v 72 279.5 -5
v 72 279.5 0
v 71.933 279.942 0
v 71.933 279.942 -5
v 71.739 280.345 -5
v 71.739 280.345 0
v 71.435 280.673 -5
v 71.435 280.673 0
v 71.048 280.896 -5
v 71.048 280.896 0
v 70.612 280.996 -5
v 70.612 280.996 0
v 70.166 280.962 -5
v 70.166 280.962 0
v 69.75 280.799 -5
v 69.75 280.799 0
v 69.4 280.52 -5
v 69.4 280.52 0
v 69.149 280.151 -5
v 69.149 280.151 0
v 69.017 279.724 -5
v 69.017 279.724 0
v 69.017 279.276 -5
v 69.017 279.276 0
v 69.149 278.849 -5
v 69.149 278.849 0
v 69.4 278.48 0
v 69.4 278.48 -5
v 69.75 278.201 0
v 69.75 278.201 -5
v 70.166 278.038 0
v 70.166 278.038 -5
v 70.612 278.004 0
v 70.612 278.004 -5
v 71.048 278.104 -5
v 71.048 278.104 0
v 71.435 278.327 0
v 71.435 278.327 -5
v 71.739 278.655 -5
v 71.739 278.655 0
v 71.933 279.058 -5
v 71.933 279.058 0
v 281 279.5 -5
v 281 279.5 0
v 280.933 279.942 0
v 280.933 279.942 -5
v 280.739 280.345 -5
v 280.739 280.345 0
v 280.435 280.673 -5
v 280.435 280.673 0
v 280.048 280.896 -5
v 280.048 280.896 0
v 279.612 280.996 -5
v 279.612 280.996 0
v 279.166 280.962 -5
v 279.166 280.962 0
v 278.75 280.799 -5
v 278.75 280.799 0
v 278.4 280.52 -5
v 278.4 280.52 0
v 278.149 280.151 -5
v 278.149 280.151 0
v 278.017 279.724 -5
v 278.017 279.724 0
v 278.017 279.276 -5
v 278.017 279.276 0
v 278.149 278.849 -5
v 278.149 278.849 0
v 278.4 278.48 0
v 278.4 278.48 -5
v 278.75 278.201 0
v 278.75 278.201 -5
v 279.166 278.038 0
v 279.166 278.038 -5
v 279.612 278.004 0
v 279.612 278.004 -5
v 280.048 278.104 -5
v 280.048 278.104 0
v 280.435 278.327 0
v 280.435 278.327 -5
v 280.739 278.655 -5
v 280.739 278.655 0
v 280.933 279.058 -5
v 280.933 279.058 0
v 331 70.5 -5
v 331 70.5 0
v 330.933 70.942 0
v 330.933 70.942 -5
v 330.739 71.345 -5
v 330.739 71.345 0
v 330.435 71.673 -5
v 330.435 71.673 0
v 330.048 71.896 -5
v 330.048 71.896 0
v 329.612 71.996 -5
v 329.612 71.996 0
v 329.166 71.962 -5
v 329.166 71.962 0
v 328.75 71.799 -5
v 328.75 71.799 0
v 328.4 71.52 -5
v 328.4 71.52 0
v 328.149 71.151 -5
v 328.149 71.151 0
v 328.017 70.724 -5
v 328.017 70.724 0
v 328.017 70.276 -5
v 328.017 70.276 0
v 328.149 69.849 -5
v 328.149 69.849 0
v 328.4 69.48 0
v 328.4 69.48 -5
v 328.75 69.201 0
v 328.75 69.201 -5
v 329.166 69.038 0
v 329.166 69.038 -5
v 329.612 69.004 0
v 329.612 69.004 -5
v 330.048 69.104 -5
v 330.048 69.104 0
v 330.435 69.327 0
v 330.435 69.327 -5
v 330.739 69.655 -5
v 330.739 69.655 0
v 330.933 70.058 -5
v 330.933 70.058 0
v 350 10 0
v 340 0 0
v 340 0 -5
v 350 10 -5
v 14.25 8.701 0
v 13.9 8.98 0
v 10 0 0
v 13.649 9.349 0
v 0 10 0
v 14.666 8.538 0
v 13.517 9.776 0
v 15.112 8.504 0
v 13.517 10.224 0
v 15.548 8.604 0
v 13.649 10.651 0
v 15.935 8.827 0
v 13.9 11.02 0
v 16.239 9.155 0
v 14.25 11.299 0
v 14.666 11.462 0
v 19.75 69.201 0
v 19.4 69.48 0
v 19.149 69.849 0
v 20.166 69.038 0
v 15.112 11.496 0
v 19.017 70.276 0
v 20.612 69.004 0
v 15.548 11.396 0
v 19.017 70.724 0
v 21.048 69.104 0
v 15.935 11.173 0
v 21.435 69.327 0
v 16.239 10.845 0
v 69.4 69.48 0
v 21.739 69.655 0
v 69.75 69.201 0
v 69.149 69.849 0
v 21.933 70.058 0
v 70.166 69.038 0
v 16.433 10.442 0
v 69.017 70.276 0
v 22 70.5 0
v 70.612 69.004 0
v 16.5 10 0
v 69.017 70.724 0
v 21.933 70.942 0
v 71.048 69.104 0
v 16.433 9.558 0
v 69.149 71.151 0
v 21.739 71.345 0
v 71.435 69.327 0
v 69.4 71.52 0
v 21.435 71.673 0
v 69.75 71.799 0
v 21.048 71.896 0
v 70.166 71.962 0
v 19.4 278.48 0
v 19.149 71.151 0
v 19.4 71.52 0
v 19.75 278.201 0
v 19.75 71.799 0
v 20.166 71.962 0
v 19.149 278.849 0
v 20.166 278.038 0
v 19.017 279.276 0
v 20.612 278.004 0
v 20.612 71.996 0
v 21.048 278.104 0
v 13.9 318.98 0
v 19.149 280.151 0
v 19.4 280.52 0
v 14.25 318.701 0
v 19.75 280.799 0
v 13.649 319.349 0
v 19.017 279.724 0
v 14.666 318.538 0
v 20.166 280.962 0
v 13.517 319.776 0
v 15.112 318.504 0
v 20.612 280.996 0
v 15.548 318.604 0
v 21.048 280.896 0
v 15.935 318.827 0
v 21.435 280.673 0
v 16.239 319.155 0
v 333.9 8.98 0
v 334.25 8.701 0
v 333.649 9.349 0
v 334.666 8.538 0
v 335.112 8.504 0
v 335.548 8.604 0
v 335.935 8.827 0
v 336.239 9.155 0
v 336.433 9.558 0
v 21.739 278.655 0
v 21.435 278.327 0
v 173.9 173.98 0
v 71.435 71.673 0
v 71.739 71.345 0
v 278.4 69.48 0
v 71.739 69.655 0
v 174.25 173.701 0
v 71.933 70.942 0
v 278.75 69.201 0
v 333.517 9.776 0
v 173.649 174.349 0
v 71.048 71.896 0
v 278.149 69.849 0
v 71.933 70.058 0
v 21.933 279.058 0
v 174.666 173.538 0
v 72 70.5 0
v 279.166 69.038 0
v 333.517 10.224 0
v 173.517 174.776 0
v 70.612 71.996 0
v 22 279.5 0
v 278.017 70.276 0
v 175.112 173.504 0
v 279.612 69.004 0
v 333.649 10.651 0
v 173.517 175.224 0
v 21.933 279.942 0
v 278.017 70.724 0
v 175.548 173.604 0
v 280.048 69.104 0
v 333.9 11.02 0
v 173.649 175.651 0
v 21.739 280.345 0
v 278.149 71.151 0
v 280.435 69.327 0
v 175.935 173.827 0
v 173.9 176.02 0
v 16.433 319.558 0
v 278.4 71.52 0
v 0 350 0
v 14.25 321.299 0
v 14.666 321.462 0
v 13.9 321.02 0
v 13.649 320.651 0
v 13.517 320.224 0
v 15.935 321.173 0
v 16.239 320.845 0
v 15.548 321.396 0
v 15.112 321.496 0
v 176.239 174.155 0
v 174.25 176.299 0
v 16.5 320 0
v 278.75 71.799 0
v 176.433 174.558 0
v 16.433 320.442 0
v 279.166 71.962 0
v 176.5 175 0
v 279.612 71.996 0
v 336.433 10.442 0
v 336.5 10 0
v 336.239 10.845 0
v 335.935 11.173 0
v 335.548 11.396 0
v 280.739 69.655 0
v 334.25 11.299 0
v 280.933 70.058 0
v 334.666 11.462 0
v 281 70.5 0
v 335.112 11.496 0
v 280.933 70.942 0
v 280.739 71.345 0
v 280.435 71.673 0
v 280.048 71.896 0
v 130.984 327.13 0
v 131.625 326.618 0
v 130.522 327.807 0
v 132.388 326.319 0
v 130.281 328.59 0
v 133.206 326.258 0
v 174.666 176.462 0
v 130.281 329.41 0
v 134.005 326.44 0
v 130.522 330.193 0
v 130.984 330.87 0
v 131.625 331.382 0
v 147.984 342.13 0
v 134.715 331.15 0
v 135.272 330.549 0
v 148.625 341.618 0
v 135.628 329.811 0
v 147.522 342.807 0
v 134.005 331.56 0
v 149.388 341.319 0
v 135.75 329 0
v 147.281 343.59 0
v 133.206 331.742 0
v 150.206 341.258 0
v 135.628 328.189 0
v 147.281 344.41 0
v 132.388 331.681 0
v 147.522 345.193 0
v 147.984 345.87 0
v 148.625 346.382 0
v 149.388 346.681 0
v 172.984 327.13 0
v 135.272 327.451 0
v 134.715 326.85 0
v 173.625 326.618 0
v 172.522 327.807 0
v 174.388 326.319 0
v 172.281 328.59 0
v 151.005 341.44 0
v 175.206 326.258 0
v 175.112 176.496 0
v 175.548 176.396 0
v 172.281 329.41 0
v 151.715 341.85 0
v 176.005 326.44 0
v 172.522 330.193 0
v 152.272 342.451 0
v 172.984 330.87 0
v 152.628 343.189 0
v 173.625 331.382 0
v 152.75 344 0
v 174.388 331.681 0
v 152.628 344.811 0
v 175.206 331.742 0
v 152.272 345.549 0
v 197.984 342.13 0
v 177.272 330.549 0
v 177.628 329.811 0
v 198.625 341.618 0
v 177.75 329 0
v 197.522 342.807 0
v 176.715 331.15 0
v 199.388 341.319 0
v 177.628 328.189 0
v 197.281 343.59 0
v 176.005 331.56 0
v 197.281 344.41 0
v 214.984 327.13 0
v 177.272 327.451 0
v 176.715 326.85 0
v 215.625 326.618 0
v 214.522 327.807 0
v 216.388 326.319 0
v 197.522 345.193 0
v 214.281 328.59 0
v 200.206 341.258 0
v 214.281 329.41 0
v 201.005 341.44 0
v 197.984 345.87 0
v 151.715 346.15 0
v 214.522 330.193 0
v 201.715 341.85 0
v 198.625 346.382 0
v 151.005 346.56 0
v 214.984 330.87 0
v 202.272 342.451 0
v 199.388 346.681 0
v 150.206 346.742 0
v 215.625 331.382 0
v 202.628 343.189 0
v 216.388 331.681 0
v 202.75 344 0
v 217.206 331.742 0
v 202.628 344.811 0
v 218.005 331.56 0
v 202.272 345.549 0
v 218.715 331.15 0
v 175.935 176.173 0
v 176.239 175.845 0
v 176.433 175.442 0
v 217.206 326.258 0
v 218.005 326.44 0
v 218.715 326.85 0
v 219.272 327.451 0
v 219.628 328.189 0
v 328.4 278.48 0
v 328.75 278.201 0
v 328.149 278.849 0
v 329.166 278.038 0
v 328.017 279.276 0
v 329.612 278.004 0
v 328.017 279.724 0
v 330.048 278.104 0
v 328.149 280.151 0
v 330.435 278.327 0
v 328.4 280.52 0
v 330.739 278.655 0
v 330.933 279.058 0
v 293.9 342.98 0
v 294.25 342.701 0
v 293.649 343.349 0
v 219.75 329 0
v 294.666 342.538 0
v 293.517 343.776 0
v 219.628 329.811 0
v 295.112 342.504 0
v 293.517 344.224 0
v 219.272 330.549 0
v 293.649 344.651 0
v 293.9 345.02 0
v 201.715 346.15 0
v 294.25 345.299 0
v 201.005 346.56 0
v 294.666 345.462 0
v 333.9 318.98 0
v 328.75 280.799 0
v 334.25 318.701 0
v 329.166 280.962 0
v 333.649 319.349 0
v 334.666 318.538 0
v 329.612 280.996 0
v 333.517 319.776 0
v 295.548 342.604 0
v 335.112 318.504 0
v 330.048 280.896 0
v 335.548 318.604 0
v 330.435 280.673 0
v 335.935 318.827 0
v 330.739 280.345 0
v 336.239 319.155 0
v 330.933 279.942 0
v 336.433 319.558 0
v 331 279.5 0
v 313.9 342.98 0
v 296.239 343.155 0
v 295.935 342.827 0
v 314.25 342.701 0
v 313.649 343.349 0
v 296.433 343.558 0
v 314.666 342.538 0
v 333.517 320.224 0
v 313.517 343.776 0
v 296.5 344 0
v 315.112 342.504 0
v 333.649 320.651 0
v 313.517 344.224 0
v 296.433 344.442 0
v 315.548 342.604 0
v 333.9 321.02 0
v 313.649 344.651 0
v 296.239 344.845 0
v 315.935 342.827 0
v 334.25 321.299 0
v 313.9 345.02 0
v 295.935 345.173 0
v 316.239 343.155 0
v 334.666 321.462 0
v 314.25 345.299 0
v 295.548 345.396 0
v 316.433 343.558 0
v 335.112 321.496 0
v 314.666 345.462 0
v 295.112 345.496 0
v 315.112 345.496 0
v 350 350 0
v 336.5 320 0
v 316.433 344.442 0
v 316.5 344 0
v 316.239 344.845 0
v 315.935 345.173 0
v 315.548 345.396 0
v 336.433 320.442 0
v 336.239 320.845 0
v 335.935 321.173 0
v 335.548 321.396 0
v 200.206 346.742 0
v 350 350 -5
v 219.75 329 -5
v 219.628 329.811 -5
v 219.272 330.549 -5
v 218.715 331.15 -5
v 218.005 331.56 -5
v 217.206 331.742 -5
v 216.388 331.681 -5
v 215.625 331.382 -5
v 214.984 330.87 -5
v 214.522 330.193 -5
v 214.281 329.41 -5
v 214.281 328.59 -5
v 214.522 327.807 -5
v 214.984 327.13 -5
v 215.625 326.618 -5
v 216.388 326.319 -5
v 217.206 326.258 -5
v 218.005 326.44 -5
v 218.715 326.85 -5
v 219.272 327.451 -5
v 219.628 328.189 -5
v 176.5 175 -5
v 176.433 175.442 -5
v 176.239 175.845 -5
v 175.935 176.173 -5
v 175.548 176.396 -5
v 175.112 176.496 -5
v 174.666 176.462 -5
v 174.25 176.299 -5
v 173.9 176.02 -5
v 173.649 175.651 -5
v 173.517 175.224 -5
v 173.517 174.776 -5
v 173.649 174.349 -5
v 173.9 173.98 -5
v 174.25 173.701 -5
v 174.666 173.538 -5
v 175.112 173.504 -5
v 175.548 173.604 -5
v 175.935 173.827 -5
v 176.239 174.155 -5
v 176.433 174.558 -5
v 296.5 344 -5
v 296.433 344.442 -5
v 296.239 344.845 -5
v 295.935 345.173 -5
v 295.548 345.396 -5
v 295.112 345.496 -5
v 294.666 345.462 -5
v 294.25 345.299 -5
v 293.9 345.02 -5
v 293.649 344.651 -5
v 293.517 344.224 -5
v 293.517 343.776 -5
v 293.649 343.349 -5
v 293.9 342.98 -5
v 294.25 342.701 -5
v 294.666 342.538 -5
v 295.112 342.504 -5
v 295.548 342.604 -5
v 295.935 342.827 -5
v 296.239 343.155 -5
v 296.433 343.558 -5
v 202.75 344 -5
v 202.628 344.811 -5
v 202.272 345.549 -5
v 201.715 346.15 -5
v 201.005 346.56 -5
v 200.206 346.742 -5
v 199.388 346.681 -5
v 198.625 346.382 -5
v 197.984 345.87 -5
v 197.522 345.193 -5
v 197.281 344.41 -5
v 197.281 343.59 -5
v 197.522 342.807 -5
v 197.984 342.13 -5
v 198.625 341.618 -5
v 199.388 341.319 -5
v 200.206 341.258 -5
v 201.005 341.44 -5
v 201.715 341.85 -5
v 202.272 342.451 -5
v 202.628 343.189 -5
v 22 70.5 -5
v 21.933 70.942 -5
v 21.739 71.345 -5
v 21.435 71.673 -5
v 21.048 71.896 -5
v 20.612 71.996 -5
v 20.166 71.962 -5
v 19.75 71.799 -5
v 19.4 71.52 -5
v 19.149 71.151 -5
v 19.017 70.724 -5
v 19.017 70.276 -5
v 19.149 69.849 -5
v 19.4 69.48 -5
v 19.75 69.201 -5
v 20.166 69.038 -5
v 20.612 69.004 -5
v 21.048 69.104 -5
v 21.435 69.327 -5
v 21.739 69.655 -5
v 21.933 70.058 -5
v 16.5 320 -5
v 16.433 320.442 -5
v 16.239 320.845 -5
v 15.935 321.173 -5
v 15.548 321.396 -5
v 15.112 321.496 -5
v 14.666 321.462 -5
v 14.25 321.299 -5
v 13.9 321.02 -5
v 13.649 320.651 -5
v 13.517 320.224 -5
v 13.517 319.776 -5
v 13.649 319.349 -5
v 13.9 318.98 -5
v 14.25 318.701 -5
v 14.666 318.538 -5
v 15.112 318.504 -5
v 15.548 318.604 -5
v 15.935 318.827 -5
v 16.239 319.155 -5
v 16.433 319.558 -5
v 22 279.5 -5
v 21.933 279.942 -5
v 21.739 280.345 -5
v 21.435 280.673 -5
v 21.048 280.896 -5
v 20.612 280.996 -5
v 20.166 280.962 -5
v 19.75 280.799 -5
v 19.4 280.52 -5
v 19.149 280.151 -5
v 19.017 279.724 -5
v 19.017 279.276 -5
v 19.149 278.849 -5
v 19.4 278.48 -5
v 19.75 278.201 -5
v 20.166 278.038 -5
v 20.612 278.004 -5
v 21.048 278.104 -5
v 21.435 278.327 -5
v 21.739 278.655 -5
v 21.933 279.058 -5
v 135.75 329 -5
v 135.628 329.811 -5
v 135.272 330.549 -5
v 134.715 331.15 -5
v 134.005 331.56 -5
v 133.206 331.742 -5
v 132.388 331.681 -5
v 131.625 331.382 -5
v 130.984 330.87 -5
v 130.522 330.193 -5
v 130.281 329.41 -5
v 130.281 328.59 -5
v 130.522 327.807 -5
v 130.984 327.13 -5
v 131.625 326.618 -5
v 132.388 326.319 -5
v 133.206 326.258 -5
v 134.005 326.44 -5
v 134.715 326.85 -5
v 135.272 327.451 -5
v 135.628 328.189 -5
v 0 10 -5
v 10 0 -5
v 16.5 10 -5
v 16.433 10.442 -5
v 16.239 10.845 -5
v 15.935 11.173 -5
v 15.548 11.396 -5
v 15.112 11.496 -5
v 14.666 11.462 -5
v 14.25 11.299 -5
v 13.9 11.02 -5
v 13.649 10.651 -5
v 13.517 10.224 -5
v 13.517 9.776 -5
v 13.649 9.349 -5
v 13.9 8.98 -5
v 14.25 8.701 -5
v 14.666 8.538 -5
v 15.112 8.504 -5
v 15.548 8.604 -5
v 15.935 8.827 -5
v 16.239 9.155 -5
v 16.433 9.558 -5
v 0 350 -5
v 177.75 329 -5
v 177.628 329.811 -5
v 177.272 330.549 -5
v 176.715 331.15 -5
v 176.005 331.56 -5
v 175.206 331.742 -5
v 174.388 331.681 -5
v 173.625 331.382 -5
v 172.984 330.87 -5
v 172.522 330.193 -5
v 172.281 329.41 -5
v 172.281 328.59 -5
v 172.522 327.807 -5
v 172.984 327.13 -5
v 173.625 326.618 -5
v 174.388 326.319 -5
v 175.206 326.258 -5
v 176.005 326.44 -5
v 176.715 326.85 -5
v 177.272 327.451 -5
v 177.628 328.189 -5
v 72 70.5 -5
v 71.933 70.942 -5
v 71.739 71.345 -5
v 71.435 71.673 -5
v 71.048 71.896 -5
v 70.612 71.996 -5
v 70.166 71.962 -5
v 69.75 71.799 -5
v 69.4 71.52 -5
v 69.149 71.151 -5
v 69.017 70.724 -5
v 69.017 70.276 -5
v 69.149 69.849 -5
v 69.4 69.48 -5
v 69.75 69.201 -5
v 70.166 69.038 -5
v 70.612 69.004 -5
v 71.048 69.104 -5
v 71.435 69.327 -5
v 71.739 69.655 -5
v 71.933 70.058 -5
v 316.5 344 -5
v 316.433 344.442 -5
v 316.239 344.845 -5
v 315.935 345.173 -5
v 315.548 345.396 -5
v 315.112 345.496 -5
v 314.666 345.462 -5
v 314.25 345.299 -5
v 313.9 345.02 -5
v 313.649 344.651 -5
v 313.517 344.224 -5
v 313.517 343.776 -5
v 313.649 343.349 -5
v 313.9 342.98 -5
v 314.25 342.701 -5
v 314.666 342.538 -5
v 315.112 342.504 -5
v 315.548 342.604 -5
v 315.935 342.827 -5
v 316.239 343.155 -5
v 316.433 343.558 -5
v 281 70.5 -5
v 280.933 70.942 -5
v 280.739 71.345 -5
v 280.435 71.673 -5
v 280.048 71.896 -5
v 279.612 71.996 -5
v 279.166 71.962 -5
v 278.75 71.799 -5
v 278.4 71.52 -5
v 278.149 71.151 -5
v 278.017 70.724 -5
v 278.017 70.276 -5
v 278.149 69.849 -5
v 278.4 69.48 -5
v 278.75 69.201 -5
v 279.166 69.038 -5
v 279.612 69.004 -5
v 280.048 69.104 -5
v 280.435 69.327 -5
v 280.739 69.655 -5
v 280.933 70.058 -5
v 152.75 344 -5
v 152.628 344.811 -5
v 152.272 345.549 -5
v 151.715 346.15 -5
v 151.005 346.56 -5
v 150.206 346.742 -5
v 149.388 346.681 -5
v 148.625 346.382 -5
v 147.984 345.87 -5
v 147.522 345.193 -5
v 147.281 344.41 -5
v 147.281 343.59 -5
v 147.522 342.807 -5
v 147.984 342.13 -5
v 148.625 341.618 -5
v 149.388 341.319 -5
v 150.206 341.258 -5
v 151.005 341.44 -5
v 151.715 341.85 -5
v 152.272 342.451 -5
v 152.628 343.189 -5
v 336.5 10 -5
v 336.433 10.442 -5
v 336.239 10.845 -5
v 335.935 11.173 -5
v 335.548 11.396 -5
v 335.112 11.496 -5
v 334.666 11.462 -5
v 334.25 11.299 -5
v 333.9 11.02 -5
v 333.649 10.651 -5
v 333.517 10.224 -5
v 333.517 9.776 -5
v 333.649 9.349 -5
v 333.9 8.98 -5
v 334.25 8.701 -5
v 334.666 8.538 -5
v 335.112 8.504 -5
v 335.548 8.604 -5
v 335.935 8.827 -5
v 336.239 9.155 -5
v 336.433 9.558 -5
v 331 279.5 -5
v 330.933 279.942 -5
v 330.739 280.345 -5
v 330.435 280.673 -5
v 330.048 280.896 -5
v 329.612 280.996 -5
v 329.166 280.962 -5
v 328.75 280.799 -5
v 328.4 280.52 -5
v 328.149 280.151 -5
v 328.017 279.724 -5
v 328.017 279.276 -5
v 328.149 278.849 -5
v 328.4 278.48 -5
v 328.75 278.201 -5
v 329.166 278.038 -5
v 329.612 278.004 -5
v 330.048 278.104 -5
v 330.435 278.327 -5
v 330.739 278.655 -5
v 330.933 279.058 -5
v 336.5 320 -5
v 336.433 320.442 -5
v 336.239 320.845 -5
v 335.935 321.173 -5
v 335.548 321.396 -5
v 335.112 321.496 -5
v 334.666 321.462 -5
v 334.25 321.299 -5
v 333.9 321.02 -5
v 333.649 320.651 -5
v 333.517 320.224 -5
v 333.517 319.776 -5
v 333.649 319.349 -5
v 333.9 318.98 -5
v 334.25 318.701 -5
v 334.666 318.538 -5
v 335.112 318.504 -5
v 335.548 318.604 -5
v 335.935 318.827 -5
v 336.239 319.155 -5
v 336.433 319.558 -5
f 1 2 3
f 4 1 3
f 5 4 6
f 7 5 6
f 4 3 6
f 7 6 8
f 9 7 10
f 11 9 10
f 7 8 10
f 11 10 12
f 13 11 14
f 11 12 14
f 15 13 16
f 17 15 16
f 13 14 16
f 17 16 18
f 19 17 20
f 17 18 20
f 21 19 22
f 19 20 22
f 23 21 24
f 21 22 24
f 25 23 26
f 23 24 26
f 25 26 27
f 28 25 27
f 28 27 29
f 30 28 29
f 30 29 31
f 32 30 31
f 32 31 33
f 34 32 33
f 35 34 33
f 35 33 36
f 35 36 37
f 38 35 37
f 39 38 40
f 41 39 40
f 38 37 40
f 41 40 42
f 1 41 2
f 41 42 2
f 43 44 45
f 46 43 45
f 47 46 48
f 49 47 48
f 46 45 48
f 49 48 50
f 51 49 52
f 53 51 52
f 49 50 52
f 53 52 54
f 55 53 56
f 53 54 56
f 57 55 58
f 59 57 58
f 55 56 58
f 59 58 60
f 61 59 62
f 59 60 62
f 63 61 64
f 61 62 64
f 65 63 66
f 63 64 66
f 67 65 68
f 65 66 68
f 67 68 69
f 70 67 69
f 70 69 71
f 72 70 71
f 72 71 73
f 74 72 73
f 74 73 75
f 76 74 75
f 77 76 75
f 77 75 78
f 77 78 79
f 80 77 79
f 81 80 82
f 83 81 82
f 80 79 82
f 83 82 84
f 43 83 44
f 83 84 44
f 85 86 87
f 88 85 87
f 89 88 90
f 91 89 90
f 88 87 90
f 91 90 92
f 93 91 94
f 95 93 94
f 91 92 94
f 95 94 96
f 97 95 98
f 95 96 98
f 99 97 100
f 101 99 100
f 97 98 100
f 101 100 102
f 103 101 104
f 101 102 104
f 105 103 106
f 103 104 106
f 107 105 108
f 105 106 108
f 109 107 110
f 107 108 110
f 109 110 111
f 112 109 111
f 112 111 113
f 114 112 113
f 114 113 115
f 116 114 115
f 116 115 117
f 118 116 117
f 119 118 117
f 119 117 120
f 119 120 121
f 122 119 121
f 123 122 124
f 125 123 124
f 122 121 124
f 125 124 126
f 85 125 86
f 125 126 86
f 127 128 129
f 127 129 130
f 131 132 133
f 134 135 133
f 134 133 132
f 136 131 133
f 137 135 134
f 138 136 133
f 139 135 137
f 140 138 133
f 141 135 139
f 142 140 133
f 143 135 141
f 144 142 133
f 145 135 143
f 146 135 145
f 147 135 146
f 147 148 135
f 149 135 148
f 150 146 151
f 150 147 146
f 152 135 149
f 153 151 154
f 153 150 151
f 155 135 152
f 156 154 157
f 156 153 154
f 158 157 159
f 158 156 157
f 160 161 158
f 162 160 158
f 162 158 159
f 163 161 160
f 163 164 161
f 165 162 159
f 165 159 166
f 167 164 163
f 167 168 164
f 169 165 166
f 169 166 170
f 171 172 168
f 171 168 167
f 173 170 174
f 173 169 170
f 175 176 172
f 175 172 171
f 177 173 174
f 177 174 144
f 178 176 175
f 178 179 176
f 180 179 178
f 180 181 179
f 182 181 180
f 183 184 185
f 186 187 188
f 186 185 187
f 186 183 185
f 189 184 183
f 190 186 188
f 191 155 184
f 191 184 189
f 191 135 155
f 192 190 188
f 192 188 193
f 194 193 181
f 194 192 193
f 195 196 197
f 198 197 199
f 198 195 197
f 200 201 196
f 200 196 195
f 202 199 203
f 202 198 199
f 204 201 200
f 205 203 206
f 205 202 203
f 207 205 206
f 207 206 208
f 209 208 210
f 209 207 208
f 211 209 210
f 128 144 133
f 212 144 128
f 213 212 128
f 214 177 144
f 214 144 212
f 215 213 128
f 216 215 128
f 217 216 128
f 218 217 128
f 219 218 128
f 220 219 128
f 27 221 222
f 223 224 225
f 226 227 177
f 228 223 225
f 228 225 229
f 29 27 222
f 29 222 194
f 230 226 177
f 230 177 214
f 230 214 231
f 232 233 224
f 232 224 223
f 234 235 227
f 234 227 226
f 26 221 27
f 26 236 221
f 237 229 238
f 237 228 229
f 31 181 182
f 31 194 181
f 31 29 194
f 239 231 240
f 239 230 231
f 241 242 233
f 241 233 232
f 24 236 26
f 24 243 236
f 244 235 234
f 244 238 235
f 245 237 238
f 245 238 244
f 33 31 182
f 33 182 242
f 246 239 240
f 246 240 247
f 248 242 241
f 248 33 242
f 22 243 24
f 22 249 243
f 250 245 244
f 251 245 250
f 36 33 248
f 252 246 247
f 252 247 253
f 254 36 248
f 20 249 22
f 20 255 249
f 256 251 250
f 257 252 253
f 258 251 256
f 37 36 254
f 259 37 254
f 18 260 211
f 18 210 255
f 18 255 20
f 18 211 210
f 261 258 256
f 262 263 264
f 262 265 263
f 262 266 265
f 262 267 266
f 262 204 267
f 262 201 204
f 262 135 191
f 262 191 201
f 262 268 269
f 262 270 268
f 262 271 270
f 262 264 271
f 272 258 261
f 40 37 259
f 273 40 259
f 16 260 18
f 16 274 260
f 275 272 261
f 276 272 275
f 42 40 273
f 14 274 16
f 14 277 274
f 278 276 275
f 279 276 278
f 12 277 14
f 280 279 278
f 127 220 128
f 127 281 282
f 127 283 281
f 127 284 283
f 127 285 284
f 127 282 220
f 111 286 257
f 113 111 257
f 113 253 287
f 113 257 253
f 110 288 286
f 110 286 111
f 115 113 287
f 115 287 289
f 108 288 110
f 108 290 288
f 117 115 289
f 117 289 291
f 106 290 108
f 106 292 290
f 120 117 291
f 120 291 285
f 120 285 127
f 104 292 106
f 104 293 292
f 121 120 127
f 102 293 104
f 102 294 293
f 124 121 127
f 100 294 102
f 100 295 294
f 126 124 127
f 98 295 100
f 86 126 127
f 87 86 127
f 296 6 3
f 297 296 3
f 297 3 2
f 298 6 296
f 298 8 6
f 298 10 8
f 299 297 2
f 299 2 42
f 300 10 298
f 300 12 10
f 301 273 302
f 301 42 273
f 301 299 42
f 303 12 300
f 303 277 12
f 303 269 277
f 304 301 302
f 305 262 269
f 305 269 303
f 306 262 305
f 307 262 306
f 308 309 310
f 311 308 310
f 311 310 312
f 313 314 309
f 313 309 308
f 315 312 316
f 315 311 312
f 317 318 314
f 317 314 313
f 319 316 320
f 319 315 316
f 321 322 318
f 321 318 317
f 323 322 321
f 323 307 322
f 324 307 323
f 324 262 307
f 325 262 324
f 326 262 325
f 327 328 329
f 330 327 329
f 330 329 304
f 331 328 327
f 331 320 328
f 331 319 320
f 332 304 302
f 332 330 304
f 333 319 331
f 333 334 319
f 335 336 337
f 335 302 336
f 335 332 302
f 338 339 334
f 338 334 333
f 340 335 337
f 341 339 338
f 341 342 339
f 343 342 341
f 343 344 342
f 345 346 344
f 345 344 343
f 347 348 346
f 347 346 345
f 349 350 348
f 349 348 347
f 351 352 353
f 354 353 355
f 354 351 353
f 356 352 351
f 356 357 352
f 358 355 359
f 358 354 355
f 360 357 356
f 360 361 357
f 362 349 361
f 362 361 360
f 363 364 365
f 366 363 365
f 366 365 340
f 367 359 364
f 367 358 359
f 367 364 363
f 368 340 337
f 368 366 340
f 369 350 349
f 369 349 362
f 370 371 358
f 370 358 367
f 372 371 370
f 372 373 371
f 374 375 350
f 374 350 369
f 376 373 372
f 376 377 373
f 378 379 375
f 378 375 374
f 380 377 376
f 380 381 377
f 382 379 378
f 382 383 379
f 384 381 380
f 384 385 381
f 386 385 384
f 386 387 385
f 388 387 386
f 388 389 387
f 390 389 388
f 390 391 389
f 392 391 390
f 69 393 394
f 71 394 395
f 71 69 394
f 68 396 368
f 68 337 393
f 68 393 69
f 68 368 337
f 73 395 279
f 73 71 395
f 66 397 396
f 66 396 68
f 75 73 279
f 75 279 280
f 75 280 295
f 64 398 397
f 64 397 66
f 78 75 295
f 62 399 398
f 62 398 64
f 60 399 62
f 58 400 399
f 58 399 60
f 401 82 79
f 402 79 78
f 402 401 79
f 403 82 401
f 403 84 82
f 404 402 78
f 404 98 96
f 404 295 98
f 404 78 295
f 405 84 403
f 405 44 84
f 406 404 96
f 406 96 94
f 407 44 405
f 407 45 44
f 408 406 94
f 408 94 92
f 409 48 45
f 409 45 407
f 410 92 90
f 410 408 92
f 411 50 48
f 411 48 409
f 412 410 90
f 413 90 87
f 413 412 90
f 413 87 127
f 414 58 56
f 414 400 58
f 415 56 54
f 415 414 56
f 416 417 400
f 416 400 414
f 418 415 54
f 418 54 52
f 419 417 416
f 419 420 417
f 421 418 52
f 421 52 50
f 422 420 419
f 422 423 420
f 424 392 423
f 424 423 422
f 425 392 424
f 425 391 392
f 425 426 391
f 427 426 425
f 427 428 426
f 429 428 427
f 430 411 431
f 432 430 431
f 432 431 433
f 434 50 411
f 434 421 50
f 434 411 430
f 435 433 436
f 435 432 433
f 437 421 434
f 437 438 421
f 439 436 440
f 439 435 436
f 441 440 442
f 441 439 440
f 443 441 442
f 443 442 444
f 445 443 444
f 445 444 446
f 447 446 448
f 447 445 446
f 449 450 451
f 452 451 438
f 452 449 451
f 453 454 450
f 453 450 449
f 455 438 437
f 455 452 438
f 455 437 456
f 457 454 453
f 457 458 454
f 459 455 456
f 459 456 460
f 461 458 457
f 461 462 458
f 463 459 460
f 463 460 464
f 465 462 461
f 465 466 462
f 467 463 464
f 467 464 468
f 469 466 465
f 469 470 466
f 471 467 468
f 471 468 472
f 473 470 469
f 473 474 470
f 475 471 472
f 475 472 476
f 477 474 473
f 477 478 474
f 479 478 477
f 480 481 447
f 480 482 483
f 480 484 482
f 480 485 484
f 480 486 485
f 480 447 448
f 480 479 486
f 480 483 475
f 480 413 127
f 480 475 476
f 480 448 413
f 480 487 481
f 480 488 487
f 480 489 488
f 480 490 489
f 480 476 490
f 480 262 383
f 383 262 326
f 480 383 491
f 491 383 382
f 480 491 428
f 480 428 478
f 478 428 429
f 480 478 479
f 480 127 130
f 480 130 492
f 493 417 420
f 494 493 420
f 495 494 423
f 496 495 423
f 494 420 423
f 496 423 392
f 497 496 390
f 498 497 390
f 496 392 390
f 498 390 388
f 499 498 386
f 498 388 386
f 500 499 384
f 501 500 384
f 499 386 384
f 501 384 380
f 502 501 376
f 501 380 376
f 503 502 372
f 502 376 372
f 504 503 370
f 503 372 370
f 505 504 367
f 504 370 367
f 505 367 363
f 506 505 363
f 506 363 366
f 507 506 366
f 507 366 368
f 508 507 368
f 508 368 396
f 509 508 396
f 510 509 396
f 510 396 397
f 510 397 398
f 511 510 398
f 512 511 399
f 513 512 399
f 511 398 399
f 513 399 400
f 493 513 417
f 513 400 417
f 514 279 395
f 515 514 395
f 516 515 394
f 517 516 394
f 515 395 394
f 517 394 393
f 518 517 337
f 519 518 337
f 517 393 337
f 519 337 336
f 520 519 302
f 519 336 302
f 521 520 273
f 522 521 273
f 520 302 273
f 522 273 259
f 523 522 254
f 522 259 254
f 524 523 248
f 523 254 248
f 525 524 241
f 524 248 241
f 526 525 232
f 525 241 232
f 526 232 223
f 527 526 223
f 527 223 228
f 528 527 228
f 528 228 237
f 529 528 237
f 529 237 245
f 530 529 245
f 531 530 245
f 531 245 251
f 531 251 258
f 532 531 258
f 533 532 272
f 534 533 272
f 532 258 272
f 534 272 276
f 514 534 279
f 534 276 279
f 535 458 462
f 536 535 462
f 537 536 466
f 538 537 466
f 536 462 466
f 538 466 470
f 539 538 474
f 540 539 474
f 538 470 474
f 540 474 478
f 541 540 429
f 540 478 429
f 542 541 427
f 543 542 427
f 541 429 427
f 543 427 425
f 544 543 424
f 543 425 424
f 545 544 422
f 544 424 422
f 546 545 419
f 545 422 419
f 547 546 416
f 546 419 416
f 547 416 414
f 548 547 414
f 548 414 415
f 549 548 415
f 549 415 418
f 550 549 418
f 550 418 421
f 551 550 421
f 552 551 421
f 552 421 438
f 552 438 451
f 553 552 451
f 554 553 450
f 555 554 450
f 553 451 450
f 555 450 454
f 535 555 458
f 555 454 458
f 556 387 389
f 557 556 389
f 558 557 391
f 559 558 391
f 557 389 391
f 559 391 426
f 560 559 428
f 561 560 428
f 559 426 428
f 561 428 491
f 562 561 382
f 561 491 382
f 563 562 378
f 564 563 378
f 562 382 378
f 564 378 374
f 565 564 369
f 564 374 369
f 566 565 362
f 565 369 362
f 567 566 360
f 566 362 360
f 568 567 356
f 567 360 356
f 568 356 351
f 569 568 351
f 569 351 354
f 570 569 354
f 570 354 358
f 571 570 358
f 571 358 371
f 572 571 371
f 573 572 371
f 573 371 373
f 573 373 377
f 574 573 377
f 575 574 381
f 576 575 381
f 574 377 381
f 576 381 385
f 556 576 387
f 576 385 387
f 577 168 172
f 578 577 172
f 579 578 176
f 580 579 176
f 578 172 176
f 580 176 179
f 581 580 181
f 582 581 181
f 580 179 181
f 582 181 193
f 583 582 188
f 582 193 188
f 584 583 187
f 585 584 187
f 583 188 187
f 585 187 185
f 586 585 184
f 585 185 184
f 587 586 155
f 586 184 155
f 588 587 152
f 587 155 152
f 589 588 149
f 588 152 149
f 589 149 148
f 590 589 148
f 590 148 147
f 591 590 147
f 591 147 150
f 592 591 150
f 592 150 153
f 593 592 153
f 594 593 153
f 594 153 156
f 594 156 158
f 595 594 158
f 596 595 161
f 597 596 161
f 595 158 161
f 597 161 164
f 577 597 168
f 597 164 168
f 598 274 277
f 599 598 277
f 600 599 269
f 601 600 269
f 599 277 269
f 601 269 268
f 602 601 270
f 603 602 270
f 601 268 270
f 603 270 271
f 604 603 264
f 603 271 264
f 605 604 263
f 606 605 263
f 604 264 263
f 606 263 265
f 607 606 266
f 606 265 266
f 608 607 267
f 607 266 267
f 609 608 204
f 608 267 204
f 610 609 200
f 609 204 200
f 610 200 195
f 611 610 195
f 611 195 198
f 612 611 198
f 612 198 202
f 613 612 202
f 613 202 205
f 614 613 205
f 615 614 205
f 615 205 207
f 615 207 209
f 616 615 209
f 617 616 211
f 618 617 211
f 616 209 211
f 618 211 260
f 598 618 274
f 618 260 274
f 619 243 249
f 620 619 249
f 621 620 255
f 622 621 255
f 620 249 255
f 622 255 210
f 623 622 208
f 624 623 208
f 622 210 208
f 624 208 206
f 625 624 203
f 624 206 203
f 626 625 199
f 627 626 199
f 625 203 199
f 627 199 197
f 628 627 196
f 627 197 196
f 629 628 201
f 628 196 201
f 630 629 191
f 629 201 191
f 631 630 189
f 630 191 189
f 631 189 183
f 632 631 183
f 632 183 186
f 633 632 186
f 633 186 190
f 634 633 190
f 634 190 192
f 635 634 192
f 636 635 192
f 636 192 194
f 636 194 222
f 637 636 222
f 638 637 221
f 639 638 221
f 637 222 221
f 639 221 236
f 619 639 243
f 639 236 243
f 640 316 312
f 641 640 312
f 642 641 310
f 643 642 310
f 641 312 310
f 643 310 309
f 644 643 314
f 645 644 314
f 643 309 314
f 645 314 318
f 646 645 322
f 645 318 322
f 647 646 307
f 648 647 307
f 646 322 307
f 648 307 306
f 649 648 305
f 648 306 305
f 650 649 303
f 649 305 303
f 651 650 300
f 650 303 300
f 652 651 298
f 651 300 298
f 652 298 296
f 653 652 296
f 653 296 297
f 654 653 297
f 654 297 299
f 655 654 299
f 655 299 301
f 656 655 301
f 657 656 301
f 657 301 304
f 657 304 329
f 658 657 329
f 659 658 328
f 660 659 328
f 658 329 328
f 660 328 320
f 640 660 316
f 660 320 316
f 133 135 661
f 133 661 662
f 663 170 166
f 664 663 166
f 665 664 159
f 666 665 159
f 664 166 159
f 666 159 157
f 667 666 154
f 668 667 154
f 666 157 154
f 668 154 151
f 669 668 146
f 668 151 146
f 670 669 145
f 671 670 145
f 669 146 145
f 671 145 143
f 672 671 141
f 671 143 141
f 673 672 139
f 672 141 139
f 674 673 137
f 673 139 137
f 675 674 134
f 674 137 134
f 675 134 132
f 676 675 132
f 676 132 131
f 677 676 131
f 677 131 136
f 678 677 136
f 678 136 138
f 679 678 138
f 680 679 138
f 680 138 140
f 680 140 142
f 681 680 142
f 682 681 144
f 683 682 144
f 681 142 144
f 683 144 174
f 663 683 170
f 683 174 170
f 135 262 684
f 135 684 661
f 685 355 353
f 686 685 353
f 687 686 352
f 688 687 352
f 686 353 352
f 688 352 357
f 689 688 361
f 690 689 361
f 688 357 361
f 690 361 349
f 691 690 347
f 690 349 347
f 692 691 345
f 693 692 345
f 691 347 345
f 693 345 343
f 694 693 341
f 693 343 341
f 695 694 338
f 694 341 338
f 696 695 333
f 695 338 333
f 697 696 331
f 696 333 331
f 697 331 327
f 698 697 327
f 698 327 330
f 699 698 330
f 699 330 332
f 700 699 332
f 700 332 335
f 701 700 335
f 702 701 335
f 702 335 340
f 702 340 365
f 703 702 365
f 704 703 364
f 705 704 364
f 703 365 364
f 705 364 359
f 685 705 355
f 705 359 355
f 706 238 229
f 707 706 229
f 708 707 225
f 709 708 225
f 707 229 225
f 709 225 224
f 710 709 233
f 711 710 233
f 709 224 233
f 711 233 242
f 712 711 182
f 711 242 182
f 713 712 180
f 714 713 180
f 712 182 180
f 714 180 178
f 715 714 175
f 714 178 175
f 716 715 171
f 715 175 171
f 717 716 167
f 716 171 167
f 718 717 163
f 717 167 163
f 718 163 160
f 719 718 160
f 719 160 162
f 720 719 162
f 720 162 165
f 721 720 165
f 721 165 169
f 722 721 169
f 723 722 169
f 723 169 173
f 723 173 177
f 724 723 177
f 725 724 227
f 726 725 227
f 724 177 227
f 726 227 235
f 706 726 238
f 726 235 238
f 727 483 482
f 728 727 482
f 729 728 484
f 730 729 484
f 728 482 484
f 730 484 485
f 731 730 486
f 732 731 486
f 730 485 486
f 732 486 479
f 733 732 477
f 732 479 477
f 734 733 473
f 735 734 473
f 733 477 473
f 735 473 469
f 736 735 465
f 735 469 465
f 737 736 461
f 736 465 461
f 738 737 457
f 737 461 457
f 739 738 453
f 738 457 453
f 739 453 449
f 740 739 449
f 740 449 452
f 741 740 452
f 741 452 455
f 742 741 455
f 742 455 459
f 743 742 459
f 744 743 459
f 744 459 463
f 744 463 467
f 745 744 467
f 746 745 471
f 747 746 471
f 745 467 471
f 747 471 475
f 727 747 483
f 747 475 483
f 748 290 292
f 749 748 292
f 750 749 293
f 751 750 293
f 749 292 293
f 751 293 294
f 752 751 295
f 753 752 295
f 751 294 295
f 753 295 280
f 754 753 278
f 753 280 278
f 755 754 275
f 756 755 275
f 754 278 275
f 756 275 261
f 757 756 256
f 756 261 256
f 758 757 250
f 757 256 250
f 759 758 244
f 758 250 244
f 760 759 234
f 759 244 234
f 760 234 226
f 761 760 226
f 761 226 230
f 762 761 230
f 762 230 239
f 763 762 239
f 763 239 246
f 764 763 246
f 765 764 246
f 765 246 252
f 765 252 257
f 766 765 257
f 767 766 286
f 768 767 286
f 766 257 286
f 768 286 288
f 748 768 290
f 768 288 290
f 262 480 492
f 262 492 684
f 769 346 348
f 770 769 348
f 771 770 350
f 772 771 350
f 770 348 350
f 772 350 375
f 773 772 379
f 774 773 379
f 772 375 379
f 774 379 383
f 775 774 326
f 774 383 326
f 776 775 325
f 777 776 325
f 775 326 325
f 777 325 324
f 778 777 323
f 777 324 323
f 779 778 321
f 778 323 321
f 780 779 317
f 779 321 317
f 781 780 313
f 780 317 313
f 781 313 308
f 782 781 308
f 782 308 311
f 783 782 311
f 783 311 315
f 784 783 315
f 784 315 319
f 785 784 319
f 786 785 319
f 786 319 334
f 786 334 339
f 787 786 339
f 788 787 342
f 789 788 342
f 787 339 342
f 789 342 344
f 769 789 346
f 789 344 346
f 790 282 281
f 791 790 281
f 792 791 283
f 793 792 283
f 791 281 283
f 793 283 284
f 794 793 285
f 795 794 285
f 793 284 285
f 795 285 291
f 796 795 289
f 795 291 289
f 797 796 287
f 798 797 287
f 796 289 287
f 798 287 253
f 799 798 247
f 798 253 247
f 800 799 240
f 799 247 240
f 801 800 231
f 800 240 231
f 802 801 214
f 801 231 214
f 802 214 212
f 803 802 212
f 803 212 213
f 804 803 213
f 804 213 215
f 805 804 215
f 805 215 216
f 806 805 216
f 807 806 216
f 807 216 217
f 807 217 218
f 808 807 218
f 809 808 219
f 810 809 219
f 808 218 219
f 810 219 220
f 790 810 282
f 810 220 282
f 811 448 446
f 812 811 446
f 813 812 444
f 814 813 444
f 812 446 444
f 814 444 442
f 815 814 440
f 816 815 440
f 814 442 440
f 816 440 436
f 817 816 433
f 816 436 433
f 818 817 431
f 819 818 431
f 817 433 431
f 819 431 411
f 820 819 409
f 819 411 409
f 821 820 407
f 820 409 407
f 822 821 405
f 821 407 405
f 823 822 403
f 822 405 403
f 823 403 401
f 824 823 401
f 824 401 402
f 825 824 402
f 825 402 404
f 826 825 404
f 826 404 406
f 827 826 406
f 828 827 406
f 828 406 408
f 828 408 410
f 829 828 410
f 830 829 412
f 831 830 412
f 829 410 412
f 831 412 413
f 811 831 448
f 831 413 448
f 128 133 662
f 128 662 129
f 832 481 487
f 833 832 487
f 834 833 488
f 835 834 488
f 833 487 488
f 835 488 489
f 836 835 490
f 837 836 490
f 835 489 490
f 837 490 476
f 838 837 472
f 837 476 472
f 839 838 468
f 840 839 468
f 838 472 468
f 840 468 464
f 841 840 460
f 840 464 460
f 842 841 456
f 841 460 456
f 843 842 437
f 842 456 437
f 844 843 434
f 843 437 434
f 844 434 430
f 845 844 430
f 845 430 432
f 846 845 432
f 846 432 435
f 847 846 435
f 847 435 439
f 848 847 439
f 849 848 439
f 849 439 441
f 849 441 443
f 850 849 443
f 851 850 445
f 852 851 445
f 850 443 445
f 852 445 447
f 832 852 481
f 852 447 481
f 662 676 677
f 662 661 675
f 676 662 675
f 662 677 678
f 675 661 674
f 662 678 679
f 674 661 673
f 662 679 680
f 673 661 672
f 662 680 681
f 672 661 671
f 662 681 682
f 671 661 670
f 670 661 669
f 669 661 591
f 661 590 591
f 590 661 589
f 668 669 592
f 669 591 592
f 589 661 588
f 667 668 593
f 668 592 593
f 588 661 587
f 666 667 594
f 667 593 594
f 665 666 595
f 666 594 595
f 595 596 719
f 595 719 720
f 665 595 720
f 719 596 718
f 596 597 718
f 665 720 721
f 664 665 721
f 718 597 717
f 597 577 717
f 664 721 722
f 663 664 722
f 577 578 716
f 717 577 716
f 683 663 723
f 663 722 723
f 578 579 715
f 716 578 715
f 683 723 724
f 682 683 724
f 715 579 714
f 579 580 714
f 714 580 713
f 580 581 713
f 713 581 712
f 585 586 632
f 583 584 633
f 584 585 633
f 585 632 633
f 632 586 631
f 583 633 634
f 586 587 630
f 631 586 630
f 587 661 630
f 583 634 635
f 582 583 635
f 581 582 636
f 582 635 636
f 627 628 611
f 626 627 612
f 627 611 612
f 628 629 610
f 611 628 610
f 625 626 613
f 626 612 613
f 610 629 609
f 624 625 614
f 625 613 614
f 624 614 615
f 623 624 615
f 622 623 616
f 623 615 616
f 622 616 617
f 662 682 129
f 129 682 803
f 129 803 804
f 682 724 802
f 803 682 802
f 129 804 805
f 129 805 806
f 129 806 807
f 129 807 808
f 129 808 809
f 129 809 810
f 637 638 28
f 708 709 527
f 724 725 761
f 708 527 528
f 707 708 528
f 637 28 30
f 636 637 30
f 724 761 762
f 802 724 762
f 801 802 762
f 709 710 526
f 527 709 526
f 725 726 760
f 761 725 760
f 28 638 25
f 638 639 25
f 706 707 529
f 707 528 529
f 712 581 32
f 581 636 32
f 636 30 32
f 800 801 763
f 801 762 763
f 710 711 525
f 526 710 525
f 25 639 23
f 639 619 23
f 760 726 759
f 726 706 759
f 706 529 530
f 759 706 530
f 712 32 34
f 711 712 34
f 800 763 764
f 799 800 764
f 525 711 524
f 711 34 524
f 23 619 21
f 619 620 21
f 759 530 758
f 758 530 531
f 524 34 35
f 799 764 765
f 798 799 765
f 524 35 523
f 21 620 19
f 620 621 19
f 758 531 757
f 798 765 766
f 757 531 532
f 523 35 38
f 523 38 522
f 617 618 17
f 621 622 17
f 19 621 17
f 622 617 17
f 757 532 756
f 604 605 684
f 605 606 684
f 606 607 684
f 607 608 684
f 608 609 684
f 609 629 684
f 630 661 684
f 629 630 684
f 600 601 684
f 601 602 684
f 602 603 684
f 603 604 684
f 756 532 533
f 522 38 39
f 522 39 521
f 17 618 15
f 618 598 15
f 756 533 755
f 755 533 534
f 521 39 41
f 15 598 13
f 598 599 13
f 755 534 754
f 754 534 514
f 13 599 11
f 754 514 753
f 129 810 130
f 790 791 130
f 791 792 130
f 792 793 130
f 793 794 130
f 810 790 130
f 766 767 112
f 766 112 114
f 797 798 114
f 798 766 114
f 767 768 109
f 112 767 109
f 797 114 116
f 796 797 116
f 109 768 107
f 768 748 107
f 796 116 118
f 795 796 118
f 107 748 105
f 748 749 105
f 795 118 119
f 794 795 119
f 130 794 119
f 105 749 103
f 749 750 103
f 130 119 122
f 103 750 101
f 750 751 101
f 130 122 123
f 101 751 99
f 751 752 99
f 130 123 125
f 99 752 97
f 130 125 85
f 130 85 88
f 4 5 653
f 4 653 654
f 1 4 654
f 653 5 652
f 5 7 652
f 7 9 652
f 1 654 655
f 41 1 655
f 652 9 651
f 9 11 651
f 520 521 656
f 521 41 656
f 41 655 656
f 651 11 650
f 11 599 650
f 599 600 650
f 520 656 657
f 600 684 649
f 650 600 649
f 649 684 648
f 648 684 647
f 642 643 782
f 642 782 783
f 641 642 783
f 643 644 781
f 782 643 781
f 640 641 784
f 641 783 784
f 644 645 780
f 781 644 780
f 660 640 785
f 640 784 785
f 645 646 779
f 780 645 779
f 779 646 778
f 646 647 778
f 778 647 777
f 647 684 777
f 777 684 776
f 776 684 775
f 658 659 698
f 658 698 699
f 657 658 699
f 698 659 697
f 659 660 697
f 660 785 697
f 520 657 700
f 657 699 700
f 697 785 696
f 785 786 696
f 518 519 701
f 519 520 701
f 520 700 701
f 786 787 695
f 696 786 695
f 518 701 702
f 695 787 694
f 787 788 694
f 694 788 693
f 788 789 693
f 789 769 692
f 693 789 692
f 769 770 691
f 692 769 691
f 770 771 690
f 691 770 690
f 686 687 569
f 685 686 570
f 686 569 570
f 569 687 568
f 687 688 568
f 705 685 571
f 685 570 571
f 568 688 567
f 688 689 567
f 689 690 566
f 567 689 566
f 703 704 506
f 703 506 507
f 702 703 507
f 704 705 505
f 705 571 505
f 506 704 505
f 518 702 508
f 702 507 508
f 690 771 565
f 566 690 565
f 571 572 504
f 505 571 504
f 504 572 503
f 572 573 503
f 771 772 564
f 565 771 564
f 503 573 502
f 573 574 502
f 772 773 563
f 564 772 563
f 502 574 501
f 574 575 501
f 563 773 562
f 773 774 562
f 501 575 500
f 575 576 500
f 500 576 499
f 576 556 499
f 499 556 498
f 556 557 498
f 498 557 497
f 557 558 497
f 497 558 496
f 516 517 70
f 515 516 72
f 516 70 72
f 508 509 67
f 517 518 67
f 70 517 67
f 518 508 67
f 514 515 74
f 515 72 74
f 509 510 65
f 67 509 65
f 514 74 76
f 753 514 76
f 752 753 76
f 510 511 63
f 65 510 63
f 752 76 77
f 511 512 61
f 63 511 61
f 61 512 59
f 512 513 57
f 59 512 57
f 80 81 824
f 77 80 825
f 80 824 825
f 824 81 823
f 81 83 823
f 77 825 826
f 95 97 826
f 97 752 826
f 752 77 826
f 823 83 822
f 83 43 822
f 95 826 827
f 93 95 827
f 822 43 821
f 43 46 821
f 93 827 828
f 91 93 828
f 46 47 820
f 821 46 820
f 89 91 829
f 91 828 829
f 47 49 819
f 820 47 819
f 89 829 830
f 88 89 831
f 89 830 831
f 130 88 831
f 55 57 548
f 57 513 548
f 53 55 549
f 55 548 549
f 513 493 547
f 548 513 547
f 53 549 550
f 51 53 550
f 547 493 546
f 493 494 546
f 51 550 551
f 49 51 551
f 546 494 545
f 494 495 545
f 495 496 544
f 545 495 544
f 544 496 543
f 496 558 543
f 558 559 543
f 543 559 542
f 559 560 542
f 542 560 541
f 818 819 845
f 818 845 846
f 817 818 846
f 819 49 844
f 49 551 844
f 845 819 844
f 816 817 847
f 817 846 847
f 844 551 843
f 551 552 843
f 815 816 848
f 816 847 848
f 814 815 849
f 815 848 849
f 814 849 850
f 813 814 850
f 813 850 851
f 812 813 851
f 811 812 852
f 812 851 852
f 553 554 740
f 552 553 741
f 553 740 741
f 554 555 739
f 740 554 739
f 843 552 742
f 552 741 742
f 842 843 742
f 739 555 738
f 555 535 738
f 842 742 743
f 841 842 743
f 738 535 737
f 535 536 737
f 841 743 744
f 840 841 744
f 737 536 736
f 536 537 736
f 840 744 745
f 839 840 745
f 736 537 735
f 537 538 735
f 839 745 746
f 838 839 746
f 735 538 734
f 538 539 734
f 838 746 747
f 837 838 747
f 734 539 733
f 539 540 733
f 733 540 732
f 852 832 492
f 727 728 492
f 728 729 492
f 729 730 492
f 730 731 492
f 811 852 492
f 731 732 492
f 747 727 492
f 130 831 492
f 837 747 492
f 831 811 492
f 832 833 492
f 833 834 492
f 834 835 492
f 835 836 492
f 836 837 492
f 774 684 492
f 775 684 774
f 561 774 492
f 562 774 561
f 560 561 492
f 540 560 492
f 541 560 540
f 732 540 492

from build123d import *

# Parameters (mm, degrees)
SCHIZZO13_R                  = 1.5
SCHIZZO13_R_2                = 2.75
ESTRUSIONE_ESTRUSIONE2_DEPTH = 5


with BuildPart() as part:
    # Schizzo13 → Estrusione-Estrusione2 (new body)
    with BuildSketch(Plane.XY):
        Polygon((10, 0), (340, 0), (350, 10), (350, 350), (0, 350), (0, 10), align=None)
        with Locations((15, 320)):
            Circle(SCHIZZO13_R, mode=Mode.SUBTRACT)
        with Locations((20.5, 279.5)):
            Circle(SCHIZZO13_R, mode=Mode.SUBTRACT)
        with Locations((70.5, 279.5)):
            Circle(SCHIZZO13_R, mode=Mode.SUBTRACT)
        with Locations((175, 175)):
            Circle(SCHIZZO13_R, mode=Mode.SUBTRACT)
        with Locations((20.5, 70.5)):
            Circle(SCHIZZO13_R, mode=Mode.SUBTRACT)
        with Locations((200, 344)):
            Circle(SCHIZZO13_R_2, mode=Mode.SUBTRACT)
        with Locations((150, 344)):
            Circle(SCHIZZO13_R_2, mode=Mode.SUBTRACT)
        with Locations((175, 329)):
            Circle(SCHIZZO13_R_2, mode=Mode.SUBTRACT)
        with Locations((217, 329)):
            Circle(SCHIZZO13_R_2, mode=Mode.SUBTRACT)
        with Locations((133, 329)):
            Circle(SCHIZZO13_R_2, mode=Mode.SUBTRACT)
        with Locations((70.5, 70.5)):
            Circle(SCHIZZO13_R, mode=Mode.SUBTRACT)
        with Locations((279.5, 70.5)):
            Circle(SCHIZZO13_R, mode=Mode.SUBTRACT)
        with Locations((329.5, 70.5)):
            Circle(SCHIZZO13_R, mode=Mode.SUBTRACT)
        with Locations((335, 10)):
            Circle(SCHIZZO13_R, mode=Mode.SUBTRACT)
        with Locations((15, 10)):
            Circle(SCHIZZO13_R, mode=Mode.SUBTRACT)
        with Locations((279.5, 279.5)):
            Circle(SCHIZZO13_R, mode=Mode.SUBTRACT)
        with Locations((329.5, 279.5)):
            Circle(SCHIZZO13_R, mode=Mode.SUBTRACT)
        with Locations((335, 320)):
            Circle(SCHIZZO13_R, mode=Mode.SUBTRACT)
        with Locations((295, 344)):
            Circle(SCHIZZO13_R, mode=Mode.SUBTRACT)
        with Locations((315, 344)):
            Circle(SCHIZZO13_R, mode=Mode.SUBTRACT)
    extrude(amount=-ESTRUSIONE_ESTRUSIONE2_DEPTH)


solid = part.part
